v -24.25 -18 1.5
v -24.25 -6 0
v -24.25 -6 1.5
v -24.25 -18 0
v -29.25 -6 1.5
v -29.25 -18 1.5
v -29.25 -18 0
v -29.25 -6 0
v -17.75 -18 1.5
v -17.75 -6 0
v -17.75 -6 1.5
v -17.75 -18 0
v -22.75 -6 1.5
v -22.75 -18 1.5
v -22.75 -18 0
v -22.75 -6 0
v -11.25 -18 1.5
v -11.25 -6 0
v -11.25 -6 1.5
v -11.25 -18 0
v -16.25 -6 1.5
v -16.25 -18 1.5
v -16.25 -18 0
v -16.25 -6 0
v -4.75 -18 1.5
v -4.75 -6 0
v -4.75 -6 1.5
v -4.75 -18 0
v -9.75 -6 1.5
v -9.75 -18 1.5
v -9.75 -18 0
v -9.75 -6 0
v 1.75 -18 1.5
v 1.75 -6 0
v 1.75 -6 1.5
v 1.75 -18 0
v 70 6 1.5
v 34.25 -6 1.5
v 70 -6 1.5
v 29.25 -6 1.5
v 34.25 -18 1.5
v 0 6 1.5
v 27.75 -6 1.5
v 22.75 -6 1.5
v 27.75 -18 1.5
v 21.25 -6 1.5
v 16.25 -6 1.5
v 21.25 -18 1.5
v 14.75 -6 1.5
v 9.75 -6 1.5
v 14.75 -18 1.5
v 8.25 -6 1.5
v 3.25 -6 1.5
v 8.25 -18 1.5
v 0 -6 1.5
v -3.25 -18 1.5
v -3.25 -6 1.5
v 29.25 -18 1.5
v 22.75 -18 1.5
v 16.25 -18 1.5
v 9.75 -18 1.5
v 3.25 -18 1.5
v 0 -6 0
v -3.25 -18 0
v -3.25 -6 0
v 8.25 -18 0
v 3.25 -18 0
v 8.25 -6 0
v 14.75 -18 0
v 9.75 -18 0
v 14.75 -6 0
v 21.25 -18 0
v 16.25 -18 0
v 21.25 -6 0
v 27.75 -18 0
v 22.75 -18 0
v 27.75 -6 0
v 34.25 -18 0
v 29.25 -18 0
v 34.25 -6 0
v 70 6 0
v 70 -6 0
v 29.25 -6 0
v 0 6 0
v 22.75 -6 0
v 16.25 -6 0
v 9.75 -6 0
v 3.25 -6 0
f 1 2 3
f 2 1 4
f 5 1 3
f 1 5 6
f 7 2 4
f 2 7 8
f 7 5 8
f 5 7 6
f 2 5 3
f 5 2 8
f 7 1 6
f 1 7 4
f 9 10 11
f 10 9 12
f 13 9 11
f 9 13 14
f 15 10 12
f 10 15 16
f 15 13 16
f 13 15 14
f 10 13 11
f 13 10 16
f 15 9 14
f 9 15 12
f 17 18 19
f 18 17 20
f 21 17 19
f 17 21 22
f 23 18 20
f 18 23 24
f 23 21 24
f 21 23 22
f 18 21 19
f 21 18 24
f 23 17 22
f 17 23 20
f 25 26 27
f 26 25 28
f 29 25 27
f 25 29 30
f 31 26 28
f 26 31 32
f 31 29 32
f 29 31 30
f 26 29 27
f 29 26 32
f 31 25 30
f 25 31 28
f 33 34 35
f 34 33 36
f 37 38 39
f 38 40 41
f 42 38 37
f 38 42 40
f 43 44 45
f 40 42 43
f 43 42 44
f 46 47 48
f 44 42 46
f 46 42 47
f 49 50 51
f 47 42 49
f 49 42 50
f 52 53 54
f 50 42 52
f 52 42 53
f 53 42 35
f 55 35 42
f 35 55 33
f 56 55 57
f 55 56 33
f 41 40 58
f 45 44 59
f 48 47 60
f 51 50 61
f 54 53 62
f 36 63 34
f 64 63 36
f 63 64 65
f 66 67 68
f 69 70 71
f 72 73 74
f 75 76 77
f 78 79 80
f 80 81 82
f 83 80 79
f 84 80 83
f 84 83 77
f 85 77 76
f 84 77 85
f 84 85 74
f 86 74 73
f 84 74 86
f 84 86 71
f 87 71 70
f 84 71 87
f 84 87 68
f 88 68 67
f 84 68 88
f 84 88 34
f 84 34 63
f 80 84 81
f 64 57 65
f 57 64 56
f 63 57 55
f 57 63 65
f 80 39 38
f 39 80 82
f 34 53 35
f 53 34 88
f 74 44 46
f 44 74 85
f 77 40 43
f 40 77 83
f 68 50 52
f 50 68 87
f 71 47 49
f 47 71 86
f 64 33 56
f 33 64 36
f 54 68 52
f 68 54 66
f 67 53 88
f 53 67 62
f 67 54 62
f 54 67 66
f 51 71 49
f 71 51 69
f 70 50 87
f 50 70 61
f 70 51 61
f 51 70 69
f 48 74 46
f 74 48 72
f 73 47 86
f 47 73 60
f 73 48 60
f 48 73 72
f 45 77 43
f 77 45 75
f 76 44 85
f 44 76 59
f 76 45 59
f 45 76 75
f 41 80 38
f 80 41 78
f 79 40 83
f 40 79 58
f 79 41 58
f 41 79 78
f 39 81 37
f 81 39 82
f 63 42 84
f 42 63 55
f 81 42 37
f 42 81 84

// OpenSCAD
// 10-well agarose gel comb - flat plate with spine and 10 hanging teeth.
// Orientation: Lying flat on XY plane, spine along X, teeth hanging in -Y.

// Dimensions
spine_len = 70;   // Length of the spine (X)
spine_w   = 12;   // Width of the spine (Y)
plate_thk = 1.5;  // Thickness of the plate (Z)

tooth_w   = 5.0;  // Width of each tooth (X)
tooth_l   = 12;   // Length of each tooth (Y)
tooth_h   = 12;   // Height of each tooth hanging from spine (Y)
num_teeth = 10;   // Number of teeth
gap       = 1.5;  // Gap between teeth (X)

$fn = 64;

// Calculate total width of the tooth row
tooth_row_w = (num_teeth * tooth_w) + ((num_teeth - 1) * gap);

// Calculate the offset to centre the tooth row on the spine width
// Spine is 12mm wide. Tooth row is centered.
// The teeth hang from the -Y edge of the spine.
// So the top of the teeth aligns with the -Y edge of the spine.
// We need to shift the tooth row in Y so its center aligns with the spine center.
// Spine center Y = 0.
// Tooth row center Y = 0.
// Tooth row extends from Y = -tooth_row_w/2 to Y = +tooth_row_w/2.
// Spine extends from Y = -spine_w/2 to Y = +spine_w/2.
// The teeth hang from the spine's -Y edge (Y = -spine_w/2).
// So the top of the teeth (Y = +tooth_h relative to spine edge) must be at Y = -spine_w/2.
// Wait, the teeth hang *from* the spine.
// Let's define the spine as the base.
// Spine Y range: [-6, 6].
// Teeth hang in -Y direction.
// So the "top" of the teeth (where they attach) is at Y = -6.
// The teeth extend from Y = -6 down to Y = -6 - tooth_h.
// The tooth row width is tooth_row_w.
// The center of the tooth row in X must be 0.
// The center of the tooth row in Y must be such that the top edge is at Y = -6.
// Center Y = (Top Y + Bottom Y) / 2 = (-6 + (-6 - tooth_h)) / 2 = -6 - tooth_h/2.

tooth_row_y_center = -spine_w / 2 - tooth_h / 2;

// Calculate X positions for the teeth
// Total width of tooth row = tooth_row_w.
// Center is at X = 0.
// We need to place num_teeth items with spacing gap.
// The positions are centered.
// Let's generate the X coordinates.
// The pattern is: tooth, gap, tooth, gap, ... tooth.
// Total width = N*tooth_w + (N-1)*gap.
// The center of the first tooth is at: - (tooth_row_w / 2) + (tooth_w / 2).
// Let's verify:
// Center of pattern = 0.
// Left edge of pattern = -tooth_row_w / 2.
// Right edge of pattern = +tooth_row_w / 2.
// First tooth center = Left edge + tooth_w / 2 = -tooth_row_w / 2 + tooth_w / 2.
// Step size = tooth_w + gap.
// Position i (0 to num_teeth-1) = First tooth center + i * step.

step = tooth_w + gap;
first_tooth_x = -tooth_row_w / 2 + tooth_w / 2;

difference() {
    union() {
        // 1. The Spine (Back Bar)
        // Dimensions: spine_len x spine_w x plate_thk
        // Centered at origin, sitting on Z=0.
        translate([0, -spine_w / 2, 0]) 
            cube([spine_len, spine_w, plate_thk]);

        // 2. The Teeth
        // Each tooth is a block of size: tooth_w x tooth_l x plate_thk
        // They hang from the spine.
        // The spine is at Y = [-6, 6].
        // The teeth hang in -Y.
        // The attachment face is at Y = -6.
        // The teeth extend from Y = -6 to Y = -6 - tooth_h.
        // Wait, the tooth length is 12mm.
        // If they hang from the spine, the dimension along Y is tooth_h.
        // The spine is 12mm wide.
        // So the teeth are 12mm long (Y) and hang from the 12mm wide spine?
        // "10 rectangular teeth that hang from one long edge of the spine in the -Y direction."
        // "Each tooth is 5.0 mm wide (X) and 12 mm long (Y)."
        // This implies the tooth length (Y) is equal to the spine width (Y).
        // So the teeth are essentially extensions of the spine width, but hanging down.
        // So the Y range of a tooth is [-6, -6 - 12] = [-6, -18].
        // The spine is at Y = [-6, 6].
        // So the teeth are attached at Y = -6.
        
        for (i = [0 : num_teeth - 1]) {
            tx = first_tooth_x + i * step;
            
            // Tooth geometry
            // X: tx - tooth_w/2 to tx + tooth_w/2
            // Y: -spine_w/2 - tooth_h to -spine_w/2 (hanging down)
            // Z: 0 to plate_thk
            
            translate([tx, -spine_w / 2 - tooth_h, 0])
                cube([tooth_w, tooth_h, plate_thk]);
        }
    }
    
    // Optional: Add a small fillet or chamfer if desired, but not requested.
    // Just the solid block.
}
